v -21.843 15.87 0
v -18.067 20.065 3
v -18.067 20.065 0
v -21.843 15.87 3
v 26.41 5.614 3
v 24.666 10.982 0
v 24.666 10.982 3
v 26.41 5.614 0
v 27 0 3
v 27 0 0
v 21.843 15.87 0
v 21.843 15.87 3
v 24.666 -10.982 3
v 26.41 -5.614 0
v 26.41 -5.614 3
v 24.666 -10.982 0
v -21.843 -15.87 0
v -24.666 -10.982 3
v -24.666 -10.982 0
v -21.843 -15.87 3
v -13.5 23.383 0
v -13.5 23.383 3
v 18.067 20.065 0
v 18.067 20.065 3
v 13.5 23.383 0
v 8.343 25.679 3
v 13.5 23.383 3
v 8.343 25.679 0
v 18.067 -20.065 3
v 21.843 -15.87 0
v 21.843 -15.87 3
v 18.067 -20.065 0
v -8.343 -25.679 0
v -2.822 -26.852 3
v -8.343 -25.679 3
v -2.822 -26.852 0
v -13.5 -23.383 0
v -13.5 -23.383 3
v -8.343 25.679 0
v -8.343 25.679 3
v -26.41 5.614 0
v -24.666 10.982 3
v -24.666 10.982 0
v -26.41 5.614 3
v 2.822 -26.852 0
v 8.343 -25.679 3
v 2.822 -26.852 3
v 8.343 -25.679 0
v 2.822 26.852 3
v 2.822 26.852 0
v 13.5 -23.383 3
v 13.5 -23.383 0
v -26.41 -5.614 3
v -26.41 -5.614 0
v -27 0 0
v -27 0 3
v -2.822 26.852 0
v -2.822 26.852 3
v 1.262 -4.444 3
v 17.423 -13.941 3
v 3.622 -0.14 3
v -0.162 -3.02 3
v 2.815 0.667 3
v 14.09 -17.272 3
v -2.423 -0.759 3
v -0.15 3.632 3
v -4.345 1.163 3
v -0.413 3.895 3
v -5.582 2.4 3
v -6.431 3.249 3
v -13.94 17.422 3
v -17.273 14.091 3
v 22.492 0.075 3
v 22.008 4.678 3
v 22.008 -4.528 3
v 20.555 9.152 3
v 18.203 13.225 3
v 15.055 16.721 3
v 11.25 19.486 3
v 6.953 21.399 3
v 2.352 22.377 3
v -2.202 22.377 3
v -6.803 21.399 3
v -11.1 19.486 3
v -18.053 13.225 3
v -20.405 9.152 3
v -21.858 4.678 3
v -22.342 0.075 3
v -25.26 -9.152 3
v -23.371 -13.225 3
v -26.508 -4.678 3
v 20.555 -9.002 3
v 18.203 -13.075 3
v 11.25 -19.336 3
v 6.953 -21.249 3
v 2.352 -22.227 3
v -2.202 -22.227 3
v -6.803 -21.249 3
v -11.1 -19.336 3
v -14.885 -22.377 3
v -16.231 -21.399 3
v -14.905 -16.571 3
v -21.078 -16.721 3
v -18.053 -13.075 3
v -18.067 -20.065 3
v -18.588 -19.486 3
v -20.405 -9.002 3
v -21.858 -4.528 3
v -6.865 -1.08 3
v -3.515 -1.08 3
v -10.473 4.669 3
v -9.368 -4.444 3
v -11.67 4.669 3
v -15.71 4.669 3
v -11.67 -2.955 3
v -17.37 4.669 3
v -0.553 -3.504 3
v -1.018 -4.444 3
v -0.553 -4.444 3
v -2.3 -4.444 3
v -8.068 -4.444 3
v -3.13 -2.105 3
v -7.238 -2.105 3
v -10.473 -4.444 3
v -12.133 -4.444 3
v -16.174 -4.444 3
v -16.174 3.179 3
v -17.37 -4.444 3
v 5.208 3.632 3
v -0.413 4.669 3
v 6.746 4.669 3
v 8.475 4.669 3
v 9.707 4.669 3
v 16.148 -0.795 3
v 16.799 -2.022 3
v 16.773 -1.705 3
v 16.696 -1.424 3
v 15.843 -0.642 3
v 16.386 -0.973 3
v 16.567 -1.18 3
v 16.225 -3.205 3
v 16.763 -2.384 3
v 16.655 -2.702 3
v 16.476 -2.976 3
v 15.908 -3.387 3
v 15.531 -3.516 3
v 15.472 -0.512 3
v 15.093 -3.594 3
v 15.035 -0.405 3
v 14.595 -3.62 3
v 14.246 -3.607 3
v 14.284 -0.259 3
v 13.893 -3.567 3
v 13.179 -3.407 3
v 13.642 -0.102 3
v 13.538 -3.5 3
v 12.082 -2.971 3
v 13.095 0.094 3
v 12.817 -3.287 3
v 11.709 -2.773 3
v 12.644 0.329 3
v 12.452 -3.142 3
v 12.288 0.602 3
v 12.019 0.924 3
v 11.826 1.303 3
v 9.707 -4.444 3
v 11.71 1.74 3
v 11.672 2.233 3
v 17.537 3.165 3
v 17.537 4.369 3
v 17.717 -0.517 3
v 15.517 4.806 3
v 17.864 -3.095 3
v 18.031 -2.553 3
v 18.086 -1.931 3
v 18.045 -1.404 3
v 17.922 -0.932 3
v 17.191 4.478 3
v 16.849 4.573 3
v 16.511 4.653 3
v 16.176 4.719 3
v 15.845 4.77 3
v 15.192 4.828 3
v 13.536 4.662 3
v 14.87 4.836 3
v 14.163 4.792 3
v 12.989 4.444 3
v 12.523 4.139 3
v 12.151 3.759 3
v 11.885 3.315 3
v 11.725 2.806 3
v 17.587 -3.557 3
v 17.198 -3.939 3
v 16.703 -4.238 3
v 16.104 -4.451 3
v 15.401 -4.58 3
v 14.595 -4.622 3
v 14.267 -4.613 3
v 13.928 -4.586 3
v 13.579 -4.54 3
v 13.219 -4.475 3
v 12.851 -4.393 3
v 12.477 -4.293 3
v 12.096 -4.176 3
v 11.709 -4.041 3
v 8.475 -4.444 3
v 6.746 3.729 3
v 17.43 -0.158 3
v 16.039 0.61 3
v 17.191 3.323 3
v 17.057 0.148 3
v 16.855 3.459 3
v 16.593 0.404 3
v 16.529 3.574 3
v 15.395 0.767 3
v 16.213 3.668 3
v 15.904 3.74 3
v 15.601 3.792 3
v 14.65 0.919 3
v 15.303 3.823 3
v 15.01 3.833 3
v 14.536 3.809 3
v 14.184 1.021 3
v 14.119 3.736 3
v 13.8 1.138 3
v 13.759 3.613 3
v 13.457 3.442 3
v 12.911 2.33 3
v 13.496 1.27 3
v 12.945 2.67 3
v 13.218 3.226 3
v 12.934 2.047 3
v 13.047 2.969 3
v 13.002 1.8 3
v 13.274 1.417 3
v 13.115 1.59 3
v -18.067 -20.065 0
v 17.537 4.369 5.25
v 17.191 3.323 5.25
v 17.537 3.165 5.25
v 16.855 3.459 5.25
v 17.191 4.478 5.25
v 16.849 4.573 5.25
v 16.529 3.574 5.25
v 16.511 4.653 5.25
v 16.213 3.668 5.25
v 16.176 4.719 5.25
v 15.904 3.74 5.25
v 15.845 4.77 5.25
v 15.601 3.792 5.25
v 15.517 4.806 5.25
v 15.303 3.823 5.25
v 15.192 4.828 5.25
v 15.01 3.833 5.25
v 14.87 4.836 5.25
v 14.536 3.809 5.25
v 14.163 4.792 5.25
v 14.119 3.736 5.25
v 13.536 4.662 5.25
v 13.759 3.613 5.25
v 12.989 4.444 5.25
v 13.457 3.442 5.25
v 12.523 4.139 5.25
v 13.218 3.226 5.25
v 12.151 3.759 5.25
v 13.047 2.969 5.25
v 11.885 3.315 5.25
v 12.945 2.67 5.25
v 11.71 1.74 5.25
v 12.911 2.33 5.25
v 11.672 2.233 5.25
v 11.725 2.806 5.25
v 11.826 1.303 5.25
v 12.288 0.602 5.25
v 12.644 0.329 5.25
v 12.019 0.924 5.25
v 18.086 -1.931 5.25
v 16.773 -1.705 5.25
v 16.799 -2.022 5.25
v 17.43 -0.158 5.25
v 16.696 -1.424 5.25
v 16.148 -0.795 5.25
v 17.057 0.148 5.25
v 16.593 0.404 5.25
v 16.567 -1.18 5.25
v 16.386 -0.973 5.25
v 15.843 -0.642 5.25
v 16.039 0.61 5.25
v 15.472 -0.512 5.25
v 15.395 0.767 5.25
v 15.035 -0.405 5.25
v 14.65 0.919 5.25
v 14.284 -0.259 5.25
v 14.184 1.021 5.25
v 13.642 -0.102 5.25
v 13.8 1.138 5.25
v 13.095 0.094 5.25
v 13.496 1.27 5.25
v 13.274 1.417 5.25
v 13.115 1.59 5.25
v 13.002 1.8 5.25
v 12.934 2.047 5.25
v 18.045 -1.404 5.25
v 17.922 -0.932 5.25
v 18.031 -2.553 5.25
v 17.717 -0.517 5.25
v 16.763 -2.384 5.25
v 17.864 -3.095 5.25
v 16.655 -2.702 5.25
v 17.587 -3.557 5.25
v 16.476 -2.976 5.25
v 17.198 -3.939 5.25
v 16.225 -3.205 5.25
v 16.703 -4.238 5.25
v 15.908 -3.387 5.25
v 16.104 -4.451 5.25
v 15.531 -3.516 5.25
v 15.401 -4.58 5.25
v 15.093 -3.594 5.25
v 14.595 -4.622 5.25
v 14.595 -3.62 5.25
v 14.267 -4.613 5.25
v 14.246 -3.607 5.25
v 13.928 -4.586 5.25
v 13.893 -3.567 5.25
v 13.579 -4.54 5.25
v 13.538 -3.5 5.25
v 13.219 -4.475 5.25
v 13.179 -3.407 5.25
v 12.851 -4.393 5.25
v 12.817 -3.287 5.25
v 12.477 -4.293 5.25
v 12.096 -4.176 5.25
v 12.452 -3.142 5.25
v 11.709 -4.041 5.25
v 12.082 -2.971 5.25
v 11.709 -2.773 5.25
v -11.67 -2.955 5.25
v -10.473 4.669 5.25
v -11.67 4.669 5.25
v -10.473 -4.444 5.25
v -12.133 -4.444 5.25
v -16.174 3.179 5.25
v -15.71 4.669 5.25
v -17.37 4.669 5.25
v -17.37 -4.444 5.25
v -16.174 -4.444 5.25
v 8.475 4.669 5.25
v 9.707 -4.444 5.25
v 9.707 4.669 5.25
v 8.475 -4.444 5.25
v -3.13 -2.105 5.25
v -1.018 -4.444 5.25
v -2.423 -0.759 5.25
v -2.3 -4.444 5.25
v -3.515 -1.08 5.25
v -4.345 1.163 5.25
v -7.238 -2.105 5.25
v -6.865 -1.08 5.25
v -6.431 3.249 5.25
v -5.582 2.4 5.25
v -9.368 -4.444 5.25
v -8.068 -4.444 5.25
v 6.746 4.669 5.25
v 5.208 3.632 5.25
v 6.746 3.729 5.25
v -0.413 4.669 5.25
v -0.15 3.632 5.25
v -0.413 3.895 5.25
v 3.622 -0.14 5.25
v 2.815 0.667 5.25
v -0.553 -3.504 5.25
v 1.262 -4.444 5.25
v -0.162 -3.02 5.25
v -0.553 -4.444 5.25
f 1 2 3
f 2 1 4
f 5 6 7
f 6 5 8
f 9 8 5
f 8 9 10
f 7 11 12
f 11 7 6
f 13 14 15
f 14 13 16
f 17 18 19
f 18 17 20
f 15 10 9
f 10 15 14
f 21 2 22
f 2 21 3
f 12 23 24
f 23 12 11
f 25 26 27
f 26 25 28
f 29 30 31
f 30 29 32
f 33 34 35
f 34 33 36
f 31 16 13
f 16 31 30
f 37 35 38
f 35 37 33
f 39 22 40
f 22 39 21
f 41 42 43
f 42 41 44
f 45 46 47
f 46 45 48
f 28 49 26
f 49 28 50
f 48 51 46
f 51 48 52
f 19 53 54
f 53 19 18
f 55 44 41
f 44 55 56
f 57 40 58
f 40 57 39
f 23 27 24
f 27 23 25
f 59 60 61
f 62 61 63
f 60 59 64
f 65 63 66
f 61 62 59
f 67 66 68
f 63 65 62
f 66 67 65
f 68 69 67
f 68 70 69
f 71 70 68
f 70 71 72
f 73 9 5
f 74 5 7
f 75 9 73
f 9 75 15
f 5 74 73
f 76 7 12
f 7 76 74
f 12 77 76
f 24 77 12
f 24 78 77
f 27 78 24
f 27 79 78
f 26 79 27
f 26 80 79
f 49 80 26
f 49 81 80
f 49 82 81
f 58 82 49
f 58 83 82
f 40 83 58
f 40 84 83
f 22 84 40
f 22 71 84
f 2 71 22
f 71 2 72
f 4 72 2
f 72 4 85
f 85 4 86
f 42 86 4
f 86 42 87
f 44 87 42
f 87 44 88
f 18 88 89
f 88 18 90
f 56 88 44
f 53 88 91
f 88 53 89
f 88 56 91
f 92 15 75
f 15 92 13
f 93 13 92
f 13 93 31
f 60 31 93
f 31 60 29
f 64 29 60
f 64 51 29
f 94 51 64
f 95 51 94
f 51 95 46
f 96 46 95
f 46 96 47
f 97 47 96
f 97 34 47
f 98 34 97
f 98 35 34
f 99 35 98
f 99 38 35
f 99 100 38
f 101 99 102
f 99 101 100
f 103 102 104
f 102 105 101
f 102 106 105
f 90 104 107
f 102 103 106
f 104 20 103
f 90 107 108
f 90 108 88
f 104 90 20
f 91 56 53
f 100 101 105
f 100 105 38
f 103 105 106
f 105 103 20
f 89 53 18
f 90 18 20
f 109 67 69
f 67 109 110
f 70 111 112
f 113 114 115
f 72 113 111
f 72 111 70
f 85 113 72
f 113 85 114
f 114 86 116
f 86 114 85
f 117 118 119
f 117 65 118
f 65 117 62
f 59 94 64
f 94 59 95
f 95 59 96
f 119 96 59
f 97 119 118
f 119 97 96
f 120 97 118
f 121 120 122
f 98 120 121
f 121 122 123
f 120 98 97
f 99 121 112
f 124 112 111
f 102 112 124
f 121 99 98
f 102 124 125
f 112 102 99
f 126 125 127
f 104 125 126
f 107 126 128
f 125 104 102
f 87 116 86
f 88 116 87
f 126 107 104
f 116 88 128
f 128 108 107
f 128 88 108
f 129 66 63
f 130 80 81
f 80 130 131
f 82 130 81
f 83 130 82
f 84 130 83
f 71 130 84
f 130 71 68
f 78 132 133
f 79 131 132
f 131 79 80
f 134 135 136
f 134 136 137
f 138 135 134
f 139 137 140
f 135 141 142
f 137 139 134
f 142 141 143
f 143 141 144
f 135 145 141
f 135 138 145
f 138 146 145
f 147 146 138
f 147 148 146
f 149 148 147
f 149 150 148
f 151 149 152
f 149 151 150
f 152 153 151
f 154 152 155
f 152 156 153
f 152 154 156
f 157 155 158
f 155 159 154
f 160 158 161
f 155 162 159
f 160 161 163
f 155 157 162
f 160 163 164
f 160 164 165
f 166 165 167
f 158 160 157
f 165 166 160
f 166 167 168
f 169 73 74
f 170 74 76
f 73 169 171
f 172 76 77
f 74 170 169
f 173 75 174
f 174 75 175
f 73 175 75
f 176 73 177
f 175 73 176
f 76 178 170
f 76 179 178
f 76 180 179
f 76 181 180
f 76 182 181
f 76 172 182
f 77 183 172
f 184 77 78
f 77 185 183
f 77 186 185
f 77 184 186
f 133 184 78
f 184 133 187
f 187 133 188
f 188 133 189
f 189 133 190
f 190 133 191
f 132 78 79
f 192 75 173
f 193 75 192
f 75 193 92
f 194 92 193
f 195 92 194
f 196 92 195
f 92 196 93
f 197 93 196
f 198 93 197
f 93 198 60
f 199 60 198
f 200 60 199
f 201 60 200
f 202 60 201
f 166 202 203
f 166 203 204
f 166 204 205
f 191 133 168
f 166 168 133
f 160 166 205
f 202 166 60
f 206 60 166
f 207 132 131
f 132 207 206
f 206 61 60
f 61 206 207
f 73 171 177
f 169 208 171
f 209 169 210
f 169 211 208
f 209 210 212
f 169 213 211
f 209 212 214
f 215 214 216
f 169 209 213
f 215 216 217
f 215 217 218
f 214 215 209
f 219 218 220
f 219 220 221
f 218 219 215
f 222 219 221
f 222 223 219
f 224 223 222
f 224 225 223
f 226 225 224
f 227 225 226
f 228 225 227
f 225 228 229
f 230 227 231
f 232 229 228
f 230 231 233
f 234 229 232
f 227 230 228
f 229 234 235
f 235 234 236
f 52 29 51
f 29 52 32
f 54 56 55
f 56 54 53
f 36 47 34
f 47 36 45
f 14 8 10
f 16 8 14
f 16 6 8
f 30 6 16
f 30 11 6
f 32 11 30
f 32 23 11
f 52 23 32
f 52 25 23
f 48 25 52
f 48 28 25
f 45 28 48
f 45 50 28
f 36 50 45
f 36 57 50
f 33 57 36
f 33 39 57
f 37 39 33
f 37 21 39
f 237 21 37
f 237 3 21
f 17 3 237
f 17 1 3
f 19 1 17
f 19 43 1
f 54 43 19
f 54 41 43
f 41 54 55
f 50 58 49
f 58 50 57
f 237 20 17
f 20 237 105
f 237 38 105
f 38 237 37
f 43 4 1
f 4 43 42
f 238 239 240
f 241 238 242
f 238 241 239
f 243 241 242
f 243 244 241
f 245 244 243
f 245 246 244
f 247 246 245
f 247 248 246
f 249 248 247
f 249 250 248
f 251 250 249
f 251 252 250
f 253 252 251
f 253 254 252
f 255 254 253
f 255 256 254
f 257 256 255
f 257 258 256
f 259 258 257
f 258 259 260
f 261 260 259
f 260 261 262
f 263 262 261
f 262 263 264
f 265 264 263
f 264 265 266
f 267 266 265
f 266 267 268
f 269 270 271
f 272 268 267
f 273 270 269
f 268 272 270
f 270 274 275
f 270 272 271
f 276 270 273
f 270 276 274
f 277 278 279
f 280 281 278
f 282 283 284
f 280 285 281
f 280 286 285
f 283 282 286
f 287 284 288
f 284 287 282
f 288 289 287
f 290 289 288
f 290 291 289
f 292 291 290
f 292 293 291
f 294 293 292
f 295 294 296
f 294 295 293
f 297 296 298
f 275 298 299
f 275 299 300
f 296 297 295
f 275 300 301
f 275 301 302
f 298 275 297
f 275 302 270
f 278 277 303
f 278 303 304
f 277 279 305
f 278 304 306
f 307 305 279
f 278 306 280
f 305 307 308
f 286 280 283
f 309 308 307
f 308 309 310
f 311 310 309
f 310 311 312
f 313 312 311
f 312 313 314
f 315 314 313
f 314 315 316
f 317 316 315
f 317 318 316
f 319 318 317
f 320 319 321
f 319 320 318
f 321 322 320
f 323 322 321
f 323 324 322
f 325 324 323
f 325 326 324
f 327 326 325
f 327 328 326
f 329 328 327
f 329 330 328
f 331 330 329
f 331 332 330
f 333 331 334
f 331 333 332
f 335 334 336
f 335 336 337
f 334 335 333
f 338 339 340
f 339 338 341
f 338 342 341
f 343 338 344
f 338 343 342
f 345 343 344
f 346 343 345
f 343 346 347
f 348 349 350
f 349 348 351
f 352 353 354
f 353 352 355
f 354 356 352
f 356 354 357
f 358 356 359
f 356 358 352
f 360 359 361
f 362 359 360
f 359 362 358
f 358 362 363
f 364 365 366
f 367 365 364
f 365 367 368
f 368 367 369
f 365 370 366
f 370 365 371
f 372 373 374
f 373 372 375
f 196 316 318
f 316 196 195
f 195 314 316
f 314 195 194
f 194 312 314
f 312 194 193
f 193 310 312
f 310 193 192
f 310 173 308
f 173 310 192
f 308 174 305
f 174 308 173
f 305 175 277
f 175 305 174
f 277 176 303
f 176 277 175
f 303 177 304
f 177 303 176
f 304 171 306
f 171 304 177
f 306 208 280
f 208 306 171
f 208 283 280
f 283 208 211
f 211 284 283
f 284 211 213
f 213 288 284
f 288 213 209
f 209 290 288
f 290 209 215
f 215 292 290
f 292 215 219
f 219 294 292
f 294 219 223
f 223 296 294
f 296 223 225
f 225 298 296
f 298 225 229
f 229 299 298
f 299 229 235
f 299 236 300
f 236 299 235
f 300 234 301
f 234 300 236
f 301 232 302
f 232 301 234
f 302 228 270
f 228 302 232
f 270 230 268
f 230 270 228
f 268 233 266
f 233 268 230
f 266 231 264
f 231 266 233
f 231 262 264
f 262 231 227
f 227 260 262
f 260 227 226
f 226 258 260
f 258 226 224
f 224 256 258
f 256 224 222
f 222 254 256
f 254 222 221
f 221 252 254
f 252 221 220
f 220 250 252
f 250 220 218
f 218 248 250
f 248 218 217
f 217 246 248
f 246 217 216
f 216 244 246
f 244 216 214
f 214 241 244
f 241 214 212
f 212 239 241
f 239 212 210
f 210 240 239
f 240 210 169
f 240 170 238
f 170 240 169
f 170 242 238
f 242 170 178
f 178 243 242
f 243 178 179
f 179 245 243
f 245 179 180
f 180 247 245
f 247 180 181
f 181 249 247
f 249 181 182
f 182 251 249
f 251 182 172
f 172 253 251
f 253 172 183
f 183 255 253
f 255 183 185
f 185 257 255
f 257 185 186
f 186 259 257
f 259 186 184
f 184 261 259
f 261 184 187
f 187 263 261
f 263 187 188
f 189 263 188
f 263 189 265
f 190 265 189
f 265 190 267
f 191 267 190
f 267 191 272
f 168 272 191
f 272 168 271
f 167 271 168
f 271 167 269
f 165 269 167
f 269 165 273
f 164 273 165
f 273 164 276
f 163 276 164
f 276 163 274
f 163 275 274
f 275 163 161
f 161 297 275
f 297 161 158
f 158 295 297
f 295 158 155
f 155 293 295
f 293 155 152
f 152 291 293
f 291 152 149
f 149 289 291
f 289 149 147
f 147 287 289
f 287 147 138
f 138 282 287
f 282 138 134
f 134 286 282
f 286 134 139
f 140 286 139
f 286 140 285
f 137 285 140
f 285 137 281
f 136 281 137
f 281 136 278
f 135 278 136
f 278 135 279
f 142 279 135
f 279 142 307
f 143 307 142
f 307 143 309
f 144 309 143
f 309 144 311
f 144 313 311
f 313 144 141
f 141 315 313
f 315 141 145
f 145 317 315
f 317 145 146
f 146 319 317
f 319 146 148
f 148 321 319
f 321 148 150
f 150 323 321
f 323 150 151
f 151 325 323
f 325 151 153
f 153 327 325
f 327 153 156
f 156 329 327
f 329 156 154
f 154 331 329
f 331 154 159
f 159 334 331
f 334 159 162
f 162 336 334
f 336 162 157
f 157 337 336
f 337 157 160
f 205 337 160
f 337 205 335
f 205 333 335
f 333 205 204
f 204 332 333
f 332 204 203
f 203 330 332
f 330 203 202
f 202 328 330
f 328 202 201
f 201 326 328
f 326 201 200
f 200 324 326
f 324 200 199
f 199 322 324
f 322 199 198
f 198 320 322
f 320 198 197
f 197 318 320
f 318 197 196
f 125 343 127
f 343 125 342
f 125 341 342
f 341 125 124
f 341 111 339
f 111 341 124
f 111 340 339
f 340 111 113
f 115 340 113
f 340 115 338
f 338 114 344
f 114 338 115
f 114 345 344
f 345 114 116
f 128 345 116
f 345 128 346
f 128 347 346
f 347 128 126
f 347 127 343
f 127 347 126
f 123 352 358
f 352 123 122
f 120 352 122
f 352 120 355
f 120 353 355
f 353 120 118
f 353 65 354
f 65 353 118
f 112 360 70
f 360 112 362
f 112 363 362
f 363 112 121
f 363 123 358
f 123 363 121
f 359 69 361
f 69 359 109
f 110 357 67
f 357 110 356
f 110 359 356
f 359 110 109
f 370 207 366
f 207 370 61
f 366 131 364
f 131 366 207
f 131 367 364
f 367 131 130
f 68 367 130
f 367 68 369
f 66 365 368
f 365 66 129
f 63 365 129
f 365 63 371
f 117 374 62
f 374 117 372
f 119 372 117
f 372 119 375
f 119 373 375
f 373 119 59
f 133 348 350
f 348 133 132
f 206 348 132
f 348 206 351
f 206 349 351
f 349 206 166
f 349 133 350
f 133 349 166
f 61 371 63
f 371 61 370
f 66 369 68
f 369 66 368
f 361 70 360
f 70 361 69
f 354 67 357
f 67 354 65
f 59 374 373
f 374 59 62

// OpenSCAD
translate(v = [0, 0, 3.0]) {
	difference() {
		union() {
			translate(v = [0, 0, -3.0]) {
				cylinder(h = 3.0, r = 27.0);
			}
			linear_extrude(height = 2.25) {
				text(font = "Mic 32Bold", halign = "center", size = 9, text = "NAZIS", valign = "center");
			}
		}
		minkowski() {
			union() {
				difference() {
					cylinder(h = 3.0, r = 27.0);
					cylinder(h = 3.0, r = 22.5);
				}
				rotate(a = [0, 0, -45]) {
					translate(v = [-24.75, 0, 0]) {
						translate(v = [0, -2.25, 0]) {
							cube(size = [49.5, 4.5, 3.0]);
						}
					}
				}
			}
			cube(size = [0.15, 0.15, 0.15]);
		}
	}
}
